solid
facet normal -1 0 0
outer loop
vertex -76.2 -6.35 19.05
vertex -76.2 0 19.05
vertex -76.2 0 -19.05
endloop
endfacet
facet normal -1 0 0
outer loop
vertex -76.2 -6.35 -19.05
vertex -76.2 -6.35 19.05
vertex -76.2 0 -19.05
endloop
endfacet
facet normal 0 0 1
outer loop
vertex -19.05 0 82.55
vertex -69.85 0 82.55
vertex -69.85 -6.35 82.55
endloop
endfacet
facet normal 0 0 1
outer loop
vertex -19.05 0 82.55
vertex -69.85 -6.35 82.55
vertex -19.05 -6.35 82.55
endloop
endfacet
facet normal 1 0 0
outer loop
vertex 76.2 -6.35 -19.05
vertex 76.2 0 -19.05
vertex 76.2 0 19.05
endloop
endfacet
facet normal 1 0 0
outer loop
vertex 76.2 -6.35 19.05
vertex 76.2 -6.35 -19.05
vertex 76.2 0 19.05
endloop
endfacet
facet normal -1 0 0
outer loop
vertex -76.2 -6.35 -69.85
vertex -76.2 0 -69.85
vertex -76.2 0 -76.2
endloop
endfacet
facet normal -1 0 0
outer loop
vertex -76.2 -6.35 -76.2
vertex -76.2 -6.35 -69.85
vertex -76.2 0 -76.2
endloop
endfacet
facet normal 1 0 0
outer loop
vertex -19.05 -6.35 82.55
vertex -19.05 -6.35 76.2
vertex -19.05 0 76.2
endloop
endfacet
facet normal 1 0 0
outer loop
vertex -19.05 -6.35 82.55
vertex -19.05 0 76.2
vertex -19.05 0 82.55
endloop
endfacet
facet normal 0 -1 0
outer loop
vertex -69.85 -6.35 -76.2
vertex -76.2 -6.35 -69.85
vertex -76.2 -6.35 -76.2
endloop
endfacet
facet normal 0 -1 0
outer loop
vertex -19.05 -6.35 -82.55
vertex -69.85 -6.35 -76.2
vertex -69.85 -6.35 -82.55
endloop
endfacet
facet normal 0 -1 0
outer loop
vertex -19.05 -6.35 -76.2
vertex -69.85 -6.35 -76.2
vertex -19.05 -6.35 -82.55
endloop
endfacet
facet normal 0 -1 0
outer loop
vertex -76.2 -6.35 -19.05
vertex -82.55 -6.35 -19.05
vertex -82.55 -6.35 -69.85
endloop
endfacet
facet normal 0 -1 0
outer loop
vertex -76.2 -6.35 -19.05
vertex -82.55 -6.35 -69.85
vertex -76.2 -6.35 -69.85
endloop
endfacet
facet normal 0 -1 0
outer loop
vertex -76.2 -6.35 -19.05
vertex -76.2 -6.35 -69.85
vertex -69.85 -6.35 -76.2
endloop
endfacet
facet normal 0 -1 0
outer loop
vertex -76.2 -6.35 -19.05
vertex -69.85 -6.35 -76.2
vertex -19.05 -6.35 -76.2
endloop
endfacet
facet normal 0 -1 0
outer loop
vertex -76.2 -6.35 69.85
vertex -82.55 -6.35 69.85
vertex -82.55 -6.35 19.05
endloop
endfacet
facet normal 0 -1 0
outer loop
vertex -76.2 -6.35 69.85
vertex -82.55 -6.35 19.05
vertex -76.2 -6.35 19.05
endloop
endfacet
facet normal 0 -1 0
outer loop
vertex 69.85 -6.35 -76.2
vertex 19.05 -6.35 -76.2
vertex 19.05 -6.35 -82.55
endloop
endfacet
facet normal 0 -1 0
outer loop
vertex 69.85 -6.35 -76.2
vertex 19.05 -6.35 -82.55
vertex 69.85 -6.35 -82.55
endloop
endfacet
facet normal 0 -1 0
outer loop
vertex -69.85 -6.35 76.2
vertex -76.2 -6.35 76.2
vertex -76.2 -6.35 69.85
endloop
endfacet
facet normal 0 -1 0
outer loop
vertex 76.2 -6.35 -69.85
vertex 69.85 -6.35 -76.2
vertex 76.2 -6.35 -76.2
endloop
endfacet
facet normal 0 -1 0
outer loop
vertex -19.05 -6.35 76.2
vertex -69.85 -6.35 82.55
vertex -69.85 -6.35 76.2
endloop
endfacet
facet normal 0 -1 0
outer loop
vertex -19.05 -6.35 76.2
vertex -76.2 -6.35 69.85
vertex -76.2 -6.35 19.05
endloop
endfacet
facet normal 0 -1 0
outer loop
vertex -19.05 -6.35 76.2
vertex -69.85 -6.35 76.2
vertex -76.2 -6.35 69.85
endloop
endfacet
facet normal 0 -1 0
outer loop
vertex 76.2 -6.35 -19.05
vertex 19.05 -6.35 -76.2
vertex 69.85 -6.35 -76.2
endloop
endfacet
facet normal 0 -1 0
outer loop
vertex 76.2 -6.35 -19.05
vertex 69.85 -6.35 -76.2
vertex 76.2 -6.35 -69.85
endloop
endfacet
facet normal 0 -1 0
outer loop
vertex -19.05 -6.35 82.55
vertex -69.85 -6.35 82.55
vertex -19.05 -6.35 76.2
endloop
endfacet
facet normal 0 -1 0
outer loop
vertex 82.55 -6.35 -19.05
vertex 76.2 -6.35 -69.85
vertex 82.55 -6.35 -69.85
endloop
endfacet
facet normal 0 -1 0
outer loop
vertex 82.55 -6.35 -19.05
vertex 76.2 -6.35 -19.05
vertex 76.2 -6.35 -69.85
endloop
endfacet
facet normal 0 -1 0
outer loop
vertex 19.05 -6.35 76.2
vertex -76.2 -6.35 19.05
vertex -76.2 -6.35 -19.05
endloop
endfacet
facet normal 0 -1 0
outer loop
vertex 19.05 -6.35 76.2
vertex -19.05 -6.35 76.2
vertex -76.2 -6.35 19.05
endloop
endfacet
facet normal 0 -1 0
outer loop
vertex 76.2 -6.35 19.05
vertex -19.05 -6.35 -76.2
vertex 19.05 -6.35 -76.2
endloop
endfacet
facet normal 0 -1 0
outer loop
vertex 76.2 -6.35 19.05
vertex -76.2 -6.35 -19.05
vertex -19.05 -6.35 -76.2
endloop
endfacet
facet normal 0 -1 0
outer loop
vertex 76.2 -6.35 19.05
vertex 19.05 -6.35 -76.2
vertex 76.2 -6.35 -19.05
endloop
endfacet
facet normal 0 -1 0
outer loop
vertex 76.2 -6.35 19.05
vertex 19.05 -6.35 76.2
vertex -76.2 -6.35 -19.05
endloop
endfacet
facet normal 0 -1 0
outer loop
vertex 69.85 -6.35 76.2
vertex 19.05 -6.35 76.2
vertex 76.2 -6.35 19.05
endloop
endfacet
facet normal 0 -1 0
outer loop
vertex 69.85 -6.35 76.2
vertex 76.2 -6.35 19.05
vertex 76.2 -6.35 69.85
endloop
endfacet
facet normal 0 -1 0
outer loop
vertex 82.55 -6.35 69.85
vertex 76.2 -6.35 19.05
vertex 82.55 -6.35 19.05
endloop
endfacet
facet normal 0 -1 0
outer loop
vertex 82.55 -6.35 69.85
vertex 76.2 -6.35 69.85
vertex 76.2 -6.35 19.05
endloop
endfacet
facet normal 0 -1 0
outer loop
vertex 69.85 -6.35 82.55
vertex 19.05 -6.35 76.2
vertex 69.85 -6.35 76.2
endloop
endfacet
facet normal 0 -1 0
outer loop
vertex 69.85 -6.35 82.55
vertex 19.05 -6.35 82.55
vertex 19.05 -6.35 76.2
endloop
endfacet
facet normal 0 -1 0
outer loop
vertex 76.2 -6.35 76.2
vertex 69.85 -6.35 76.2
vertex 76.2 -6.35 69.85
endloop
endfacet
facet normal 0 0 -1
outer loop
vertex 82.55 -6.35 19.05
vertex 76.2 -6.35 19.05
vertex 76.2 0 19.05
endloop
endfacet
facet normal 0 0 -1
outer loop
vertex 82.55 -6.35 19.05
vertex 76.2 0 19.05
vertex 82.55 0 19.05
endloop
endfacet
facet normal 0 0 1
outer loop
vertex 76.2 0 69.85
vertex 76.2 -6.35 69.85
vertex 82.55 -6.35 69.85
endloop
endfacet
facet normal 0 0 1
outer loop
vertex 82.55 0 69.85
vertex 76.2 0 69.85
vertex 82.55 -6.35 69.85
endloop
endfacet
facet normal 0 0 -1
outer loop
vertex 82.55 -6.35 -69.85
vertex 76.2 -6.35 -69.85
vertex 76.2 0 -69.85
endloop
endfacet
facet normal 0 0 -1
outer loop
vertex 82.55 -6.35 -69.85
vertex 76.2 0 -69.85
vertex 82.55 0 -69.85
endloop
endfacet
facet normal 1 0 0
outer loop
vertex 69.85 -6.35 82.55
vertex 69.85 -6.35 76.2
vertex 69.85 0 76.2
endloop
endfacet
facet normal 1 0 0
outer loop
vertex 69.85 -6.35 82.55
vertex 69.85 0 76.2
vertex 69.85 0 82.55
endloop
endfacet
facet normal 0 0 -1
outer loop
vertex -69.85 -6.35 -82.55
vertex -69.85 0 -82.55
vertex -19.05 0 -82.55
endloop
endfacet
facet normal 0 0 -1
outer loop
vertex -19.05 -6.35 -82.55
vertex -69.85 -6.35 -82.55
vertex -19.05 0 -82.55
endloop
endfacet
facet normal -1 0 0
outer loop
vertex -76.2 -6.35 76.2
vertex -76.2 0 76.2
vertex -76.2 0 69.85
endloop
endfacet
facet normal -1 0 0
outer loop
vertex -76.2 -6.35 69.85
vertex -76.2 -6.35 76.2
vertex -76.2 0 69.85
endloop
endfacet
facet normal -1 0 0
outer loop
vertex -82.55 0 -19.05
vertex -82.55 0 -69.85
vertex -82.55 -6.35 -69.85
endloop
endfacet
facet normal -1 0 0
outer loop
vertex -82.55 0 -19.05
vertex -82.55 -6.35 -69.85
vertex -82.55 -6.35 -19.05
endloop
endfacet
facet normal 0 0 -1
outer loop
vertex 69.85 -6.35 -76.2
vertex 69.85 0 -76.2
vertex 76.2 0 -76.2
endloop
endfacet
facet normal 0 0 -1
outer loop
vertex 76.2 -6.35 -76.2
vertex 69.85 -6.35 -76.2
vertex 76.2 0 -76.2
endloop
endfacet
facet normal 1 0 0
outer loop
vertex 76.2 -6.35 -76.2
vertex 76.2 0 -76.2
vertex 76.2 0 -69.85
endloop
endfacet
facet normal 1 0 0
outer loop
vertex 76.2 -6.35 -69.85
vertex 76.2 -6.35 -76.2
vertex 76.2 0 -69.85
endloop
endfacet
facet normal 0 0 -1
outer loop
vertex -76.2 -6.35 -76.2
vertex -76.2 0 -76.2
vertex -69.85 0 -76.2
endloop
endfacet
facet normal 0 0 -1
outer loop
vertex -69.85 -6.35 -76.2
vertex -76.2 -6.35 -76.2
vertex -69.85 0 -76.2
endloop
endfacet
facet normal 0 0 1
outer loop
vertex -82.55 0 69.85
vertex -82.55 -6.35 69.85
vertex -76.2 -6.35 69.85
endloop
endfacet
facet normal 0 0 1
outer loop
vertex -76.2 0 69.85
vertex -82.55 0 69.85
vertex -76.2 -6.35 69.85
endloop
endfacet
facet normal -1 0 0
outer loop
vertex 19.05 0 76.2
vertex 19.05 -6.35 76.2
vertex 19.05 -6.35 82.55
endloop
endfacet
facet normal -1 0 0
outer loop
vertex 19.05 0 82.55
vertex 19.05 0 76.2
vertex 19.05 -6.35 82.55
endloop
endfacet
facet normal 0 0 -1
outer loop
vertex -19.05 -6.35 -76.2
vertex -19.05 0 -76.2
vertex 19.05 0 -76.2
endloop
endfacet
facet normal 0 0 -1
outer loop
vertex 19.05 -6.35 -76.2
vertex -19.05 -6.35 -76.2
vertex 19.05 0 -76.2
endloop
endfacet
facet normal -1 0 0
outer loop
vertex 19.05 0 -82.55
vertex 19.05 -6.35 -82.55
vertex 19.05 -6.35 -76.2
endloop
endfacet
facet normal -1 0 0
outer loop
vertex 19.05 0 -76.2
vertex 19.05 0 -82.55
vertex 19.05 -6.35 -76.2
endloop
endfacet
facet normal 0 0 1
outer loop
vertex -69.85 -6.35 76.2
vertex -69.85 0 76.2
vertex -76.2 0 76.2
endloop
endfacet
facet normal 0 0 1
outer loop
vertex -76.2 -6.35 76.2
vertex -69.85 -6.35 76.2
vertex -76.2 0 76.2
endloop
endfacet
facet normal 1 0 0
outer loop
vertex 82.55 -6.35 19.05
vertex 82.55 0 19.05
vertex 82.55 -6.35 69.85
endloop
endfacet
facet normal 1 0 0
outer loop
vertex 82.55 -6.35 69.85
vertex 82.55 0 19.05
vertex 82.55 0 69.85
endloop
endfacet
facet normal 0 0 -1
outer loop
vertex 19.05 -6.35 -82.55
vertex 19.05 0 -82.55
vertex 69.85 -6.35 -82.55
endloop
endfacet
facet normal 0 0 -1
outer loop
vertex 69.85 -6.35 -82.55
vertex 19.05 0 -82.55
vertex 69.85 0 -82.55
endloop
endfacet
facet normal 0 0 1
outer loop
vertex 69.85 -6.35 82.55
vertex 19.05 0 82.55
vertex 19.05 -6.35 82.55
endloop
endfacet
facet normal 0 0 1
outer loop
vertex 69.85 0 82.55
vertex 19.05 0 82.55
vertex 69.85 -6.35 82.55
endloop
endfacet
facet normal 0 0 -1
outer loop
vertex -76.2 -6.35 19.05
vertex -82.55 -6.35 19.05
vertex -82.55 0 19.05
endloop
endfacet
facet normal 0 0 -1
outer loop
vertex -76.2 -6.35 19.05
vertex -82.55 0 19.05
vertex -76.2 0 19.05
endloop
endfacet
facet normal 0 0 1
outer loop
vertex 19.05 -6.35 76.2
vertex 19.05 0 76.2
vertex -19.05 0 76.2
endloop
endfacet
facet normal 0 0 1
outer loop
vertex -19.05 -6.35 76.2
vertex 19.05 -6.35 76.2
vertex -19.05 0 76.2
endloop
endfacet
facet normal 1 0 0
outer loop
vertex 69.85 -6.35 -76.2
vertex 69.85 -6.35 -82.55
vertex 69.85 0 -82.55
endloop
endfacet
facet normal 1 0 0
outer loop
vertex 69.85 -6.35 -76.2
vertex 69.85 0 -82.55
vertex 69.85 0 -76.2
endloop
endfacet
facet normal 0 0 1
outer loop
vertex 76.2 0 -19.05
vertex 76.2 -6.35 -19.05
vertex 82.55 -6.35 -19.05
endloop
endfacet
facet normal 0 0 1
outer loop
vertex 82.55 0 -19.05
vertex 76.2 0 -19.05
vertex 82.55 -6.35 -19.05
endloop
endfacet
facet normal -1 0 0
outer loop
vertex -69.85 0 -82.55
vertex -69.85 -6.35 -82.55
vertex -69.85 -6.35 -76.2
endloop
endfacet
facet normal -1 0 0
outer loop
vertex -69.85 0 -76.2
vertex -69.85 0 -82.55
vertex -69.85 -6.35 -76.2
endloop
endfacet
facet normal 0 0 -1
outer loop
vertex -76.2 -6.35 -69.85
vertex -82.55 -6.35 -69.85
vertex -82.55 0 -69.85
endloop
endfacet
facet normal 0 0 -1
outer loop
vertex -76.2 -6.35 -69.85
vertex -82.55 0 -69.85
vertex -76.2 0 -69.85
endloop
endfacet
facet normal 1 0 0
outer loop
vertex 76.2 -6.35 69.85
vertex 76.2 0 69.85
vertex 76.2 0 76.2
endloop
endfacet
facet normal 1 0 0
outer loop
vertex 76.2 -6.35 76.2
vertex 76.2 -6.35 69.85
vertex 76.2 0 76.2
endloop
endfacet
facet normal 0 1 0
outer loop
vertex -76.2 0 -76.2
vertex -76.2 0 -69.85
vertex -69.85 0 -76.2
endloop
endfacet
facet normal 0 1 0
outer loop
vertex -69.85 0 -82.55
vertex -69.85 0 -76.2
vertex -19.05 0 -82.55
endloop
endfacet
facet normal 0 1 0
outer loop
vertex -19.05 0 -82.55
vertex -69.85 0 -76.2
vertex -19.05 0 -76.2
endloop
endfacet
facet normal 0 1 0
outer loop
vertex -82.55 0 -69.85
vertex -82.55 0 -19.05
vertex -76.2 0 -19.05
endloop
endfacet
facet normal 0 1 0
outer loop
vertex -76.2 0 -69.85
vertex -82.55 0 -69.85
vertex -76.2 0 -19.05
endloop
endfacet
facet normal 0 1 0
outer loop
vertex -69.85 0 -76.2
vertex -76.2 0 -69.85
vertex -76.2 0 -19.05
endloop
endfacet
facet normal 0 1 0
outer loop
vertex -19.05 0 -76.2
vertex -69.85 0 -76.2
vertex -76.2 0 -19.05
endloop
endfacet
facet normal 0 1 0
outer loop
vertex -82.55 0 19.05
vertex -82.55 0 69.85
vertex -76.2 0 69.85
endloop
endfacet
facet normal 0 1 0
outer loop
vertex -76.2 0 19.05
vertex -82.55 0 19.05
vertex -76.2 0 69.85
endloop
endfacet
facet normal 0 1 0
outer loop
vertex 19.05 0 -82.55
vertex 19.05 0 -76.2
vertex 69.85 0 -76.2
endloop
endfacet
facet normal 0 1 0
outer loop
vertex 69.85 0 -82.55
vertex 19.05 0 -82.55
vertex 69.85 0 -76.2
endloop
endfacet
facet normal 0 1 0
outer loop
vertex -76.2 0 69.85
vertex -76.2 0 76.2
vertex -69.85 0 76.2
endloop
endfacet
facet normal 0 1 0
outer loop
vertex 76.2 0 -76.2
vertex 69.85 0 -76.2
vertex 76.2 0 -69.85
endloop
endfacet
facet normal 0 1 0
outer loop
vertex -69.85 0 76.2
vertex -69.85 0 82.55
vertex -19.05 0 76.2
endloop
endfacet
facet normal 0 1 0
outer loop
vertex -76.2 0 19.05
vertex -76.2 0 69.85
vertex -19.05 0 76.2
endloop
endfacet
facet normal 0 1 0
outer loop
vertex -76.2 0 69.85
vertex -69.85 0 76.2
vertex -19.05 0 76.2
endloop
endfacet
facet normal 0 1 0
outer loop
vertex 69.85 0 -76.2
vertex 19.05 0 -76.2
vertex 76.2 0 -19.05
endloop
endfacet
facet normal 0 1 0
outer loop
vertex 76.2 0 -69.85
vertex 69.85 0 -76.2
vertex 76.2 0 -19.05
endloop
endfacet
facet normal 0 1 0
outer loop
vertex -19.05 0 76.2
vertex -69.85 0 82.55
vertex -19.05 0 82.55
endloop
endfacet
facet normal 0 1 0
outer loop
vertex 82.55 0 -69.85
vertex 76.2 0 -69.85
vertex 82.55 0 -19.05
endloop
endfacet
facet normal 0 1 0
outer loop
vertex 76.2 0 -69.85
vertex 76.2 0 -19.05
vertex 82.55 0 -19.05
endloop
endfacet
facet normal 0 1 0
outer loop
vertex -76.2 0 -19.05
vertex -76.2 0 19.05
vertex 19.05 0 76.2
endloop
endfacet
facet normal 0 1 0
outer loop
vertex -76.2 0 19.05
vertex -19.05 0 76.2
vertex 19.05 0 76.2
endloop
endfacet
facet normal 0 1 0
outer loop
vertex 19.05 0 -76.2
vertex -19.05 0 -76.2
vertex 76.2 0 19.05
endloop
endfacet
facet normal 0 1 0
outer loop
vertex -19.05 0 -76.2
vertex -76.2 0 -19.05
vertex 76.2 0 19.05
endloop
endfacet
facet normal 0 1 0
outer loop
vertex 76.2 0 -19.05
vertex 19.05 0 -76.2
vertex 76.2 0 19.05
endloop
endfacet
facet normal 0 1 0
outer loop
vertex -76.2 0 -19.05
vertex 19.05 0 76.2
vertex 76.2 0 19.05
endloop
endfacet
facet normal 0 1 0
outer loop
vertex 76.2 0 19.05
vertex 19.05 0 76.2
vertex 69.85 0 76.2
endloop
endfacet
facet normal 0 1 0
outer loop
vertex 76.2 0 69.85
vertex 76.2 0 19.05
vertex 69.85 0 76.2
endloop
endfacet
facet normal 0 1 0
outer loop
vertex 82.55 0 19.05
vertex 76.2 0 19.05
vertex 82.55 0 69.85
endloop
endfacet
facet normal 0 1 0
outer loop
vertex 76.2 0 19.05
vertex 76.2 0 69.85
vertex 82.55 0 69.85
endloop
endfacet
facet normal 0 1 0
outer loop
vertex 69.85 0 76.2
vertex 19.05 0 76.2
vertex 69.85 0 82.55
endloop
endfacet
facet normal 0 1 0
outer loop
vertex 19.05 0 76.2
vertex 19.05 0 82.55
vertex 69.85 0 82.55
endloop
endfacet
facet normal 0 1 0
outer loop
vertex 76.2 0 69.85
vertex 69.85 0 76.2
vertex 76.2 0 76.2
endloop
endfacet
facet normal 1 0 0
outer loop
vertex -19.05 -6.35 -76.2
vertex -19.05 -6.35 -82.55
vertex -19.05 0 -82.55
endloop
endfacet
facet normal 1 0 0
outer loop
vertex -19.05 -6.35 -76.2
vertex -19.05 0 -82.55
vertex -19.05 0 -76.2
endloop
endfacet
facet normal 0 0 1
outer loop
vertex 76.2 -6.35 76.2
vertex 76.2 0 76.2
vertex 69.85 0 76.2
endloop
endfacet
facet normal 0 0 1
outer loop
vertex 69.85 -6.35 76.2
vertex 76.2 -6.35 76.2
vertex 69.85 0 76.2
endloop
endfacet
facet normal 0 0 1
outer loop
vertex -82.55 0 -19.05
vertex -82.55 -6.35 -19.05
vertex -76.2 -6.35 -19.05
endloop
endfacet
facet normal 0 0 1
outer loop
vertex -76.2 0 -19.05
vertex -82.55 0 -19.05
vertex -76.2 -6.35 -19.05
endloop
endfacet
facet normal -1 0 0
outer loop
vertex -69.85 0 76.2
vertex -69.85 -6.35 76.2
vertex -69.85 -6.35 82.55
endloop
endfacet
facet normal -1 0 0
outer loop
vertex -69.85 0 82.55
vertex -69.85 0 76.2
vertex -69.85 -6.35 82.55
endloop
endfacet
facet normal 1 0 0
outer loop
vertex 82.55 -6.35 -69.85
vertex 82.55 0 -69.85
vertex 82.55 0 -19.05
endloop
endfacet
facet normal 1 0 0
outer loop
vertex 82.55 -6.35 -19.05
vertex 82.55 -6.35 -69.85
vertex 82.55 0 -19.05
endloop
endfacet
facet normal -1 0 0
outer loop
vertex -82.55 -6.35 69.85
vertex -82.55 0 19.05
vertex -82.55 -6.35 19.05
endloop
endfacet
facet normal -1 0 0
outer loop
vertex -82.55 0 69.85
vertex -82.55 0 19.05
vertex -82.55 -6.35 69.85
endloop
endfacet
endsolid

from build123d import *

# Parameters (mm, degrees)
F0_W     = 50.8
F0_H     = 6.35
F0_W_2   = 6.35
F0_H_2   = 50.8
F1_DEPTH = 6.35


with BuildPart() as f1:
    # F0 (on Front) → F1 (new body)
    with BuildSketch(Plane.XZ):
        Polygon((-69.85, 76.2), (-76.2, 76.2), (-76.2, 69.85), (-76.2, 19.05), (-76.2, -19.05), (-76.2, -69.85), (-76.2, -76.2), (-69.85, -76.2), (-19.05, -76.2), (19.05, -76.2), (69.85, -76.2), (76.2, -76.2), (76.2, -69.85), (76.2, -19.05), (76.2, 19.05), (76.2, 69.85), (76.2, 76.2), (69.85, 76.2), (19.05, 76.2), (-19.05, 76.2), align=None)
        with Locations((-44.45, 79.375)):
            Rectangle(F0_W, F0_H)
        with Locations((-79.375, 44.45)):
            Rectangle(F0_W_2, F0_H_2)
        with Locations((44.45, 79.375)):
            Rectangle(F0_W, F0_H)
        with Locations((-79.375, -44.45)):
            Rectangle(F0_W_2, F0_H_2)
        with Locations((79.375, 44.45)):
            Rectangle(F0_W_2, F0_H_2)
        with Locations((-44.45, -79.375)):
            Rectangle(F0_W, F0_H)
        with Locations((79.375, -44.45)):
            Rectangle(F0_W_2, F0_H_2)
        with Locations((44.45, -79.375)):
            Rectangle(F0_W, F0_H)
    extrude(amount=F1_DEPTH)


solid = f1.part
